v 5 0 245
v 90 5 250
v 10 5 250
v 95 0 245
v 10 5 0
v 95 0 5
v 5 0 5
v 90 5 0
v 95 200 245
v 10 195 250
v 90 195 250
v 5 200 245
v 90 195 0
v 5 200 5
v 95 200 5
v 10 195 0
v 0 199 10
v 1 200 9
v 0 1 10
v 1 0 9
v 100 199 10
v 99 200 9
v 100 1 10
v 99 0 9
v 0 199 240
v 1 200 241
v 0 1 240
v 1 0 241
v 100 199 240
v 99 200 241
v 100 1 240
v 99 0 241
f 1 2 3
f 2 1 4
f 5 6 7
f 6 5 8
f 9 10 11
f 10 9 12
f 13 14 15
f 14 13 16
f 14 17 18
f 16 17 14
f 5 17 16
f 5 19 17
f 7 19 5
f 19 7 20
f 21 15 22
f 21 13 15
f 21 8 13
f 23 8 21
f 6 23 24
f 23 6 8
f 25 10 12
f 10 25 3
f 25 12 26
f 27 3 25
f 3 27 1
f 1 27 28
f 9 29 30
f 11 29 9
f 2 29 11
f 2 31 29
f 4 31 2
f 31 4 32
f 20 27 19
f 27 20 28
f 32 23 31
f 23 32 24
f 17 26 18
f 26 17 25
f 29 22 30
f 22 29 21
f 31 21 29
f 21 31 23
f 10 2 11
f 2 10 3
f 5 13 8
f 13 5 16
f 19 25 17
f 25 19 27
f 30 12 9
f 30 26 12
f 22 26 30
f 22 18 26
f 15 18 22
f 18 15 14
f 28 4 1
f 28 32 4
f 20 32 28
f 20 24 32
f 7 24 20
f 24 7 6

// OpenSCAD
// (c) 2014 juewei@fabfolk.com
//
// a bevelled (or camfered) box

module bbox_chamfer_cutaway_z(x,y,z,b)
{
  translate([b,0,-10]) rotate([0,0,90+45]) cube([2*b,2*b,z+20]);
  translate([x-b,0,-10]) rotate([0,0,-45]) cube([2*b,2*b,z+20]);

  translate([b,y,-10]) rotate([0,0,90+45]) cube([2*b,2*b,z+20]);
  translate([x-b,y,-10]) rotate([0,0,-45]) cube([2*b,2*b,z+20]);
}

module bbox_x(x,y,z,b)
{
  difference()
    {
      cube([x,y,z]);
      translate([0,0,z])rotate([0,90,0]) bbox_chamfer_cutaway_z(z,y,x,b);
    }
}

module bbox_y(x,y,z,b)
{
  difference()
    {
      cube([x,y,z]);
      translate([0,y,0])rotate([90,0,0]) bbox_chamfer_cutaway_z(x,z,y,b);
    }
}

module bbox_z(x,y,z,b)
{
  difference()
    {
      cube([x,y,z]);
      bbox_chamfer_cutaway_z(x,y,z,b);
    }
}

module bbox(x,y,z,b=0,bx=0,by=0,bz=0)
{
  difference()
    {
      cube([x,y,z]);
      if (b > 0)
        {
          translate([0,0,z])rotate([0,90,0]) bbox_chamfer_cutaway_z(z,y,x,b);
          translate([0,y,0])rotate([90,0,0]) bbox_chamfer_cutaway_z(x,z,y,b);
          bbox_chamfer_cutaway_z(x,y,z,b);
	}

      if (bx > 0) translate([0,0,z])rotate([0,90,0]) bbox_chamfer_cutaway_z(z,y,x,bx);
      if (by > 0) translate([0,y,0])rotate([90,0,0]) bbox_chamfer_cutaway_z(x,z,y,by);
      if (bz > 0) bbox_chamfer_cutaway_z(x,y,z,bz);
    }
}

bbox(100,200,250, bx=5,by=10,bz=1);
